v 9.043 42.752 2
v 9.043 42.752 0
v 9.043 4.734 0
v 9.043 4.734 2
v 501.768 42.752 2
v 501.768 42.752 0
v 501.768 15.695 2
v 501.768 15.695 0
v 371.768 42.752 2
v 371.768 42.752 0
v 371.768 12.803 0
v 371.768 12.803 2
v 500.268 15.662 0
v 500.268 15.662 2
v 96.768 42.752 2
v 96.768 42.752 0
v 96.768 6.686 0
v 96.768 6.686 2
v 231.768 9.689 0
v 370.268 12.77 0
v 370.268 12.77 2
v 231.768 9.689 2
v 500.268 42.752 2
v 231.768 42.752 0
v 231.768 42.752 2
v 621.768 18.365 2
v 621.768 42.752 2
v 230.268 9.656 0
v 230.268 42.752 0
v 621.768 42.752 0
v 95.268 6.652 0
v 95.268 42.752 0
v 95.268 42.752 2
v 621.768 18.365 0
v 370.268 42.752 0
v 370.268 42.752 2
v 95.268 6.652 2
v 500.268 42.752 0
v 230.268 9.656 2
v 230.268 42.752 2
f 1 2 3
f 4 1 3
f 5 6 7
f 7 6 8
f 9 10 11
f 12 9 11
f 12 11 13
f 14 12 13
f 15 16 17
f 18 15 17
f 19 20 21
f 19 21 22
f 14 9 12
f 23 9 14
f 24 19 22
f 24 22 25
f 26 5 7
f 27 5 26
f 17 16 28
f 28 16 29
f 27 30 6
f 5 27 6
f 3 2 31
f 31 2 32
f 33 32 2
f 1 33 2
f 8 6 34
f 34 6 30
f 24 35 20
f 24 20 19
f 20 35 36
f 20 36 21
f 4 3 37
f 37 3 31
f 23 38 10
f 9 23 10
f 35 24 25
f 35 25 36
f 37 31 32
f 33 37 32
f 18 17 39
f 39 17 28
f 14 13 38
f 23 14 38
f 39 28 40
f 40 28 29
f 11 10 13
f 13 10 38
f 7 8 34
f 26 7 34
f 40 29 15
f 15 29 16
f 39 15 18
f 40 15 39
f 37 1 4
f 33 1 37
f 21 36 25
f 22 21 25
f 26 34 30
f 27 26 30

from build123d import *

# Parameters (mm, degrees)
EXTRUDE_1_DEPTH   = 2
EXTRUDE_1_2_DEPTH = 2
EXTRUDE_1_3_DEPTH = 2
EXTRUDE_1_4_DEPTH = 2
EXTRUDE_1_5_DEPTH = 2


with BuildPart() as part:
    # 草图1 → 凸台-拉伸1 (new body)
    with BuildSketch(Plane.XY):
        Polygon((9.042992345, 42.752160749), (9.042992345, 4.734107643), (95.268336964, 6.652285198), (95.268336964, 42.752161033), align=None)
    extrude(amount=EXTRUDE_1_DEPTH)


with BuildPart() as body_2:
    # 草图1 → Extrude 1 2 (new body)
    with BuildSketch(Plane.XY):
        Polygon((96.768336964, 42.752161038), (96.768336964, 6.685654347), (230.268336964, 9.655508567), (230.268336964, 42.752161477), align=None)
    extrude(amount=EXTRUDE_1_2_DEPTH)


with BuildPart() as body_3:
    # 草图1 → Extrude 1 3 (new body)
    with BuildSketch(Plane.XY):
        Polygon((231.768336964, 42.752161482), (370.268336964, 42.752161939), (370.268336964, 12.769962432), (231.768336964, 9.688877716), align=None)
    extrude(amount=EXTRUDE_1_3_DEPTH)


with BuildPart() as body_4:
    # 草图1 → Extrude 1 4 (new body)
    with BuildSketch(Plane.XY):
        Polygon((371.768336964, 42.752161943), (371.768336964, 12.80333158), (500.268336964, 15.661955306), (500.268336964, 42.752162367), align=None)
    extrude(amount=EXTRUDE_1_4_DEPTH)


with BuildPart() as body_5:
    # 草图1 → Extrude 1 5 (new body)
    with BuildSketch(Plane.XY):
        Polygon((501.768336964, 42.752162372), (501.768336964, 15.695324454), (621.768336633, 18.364856331), (621.76833689, 42.752162767), align=None)
    extrude(amount=EXTRUDE_1_5_DEPTH)


solid = Compound([part.part, body_2.part, body_3.part, body_4.part, body_5.part])
